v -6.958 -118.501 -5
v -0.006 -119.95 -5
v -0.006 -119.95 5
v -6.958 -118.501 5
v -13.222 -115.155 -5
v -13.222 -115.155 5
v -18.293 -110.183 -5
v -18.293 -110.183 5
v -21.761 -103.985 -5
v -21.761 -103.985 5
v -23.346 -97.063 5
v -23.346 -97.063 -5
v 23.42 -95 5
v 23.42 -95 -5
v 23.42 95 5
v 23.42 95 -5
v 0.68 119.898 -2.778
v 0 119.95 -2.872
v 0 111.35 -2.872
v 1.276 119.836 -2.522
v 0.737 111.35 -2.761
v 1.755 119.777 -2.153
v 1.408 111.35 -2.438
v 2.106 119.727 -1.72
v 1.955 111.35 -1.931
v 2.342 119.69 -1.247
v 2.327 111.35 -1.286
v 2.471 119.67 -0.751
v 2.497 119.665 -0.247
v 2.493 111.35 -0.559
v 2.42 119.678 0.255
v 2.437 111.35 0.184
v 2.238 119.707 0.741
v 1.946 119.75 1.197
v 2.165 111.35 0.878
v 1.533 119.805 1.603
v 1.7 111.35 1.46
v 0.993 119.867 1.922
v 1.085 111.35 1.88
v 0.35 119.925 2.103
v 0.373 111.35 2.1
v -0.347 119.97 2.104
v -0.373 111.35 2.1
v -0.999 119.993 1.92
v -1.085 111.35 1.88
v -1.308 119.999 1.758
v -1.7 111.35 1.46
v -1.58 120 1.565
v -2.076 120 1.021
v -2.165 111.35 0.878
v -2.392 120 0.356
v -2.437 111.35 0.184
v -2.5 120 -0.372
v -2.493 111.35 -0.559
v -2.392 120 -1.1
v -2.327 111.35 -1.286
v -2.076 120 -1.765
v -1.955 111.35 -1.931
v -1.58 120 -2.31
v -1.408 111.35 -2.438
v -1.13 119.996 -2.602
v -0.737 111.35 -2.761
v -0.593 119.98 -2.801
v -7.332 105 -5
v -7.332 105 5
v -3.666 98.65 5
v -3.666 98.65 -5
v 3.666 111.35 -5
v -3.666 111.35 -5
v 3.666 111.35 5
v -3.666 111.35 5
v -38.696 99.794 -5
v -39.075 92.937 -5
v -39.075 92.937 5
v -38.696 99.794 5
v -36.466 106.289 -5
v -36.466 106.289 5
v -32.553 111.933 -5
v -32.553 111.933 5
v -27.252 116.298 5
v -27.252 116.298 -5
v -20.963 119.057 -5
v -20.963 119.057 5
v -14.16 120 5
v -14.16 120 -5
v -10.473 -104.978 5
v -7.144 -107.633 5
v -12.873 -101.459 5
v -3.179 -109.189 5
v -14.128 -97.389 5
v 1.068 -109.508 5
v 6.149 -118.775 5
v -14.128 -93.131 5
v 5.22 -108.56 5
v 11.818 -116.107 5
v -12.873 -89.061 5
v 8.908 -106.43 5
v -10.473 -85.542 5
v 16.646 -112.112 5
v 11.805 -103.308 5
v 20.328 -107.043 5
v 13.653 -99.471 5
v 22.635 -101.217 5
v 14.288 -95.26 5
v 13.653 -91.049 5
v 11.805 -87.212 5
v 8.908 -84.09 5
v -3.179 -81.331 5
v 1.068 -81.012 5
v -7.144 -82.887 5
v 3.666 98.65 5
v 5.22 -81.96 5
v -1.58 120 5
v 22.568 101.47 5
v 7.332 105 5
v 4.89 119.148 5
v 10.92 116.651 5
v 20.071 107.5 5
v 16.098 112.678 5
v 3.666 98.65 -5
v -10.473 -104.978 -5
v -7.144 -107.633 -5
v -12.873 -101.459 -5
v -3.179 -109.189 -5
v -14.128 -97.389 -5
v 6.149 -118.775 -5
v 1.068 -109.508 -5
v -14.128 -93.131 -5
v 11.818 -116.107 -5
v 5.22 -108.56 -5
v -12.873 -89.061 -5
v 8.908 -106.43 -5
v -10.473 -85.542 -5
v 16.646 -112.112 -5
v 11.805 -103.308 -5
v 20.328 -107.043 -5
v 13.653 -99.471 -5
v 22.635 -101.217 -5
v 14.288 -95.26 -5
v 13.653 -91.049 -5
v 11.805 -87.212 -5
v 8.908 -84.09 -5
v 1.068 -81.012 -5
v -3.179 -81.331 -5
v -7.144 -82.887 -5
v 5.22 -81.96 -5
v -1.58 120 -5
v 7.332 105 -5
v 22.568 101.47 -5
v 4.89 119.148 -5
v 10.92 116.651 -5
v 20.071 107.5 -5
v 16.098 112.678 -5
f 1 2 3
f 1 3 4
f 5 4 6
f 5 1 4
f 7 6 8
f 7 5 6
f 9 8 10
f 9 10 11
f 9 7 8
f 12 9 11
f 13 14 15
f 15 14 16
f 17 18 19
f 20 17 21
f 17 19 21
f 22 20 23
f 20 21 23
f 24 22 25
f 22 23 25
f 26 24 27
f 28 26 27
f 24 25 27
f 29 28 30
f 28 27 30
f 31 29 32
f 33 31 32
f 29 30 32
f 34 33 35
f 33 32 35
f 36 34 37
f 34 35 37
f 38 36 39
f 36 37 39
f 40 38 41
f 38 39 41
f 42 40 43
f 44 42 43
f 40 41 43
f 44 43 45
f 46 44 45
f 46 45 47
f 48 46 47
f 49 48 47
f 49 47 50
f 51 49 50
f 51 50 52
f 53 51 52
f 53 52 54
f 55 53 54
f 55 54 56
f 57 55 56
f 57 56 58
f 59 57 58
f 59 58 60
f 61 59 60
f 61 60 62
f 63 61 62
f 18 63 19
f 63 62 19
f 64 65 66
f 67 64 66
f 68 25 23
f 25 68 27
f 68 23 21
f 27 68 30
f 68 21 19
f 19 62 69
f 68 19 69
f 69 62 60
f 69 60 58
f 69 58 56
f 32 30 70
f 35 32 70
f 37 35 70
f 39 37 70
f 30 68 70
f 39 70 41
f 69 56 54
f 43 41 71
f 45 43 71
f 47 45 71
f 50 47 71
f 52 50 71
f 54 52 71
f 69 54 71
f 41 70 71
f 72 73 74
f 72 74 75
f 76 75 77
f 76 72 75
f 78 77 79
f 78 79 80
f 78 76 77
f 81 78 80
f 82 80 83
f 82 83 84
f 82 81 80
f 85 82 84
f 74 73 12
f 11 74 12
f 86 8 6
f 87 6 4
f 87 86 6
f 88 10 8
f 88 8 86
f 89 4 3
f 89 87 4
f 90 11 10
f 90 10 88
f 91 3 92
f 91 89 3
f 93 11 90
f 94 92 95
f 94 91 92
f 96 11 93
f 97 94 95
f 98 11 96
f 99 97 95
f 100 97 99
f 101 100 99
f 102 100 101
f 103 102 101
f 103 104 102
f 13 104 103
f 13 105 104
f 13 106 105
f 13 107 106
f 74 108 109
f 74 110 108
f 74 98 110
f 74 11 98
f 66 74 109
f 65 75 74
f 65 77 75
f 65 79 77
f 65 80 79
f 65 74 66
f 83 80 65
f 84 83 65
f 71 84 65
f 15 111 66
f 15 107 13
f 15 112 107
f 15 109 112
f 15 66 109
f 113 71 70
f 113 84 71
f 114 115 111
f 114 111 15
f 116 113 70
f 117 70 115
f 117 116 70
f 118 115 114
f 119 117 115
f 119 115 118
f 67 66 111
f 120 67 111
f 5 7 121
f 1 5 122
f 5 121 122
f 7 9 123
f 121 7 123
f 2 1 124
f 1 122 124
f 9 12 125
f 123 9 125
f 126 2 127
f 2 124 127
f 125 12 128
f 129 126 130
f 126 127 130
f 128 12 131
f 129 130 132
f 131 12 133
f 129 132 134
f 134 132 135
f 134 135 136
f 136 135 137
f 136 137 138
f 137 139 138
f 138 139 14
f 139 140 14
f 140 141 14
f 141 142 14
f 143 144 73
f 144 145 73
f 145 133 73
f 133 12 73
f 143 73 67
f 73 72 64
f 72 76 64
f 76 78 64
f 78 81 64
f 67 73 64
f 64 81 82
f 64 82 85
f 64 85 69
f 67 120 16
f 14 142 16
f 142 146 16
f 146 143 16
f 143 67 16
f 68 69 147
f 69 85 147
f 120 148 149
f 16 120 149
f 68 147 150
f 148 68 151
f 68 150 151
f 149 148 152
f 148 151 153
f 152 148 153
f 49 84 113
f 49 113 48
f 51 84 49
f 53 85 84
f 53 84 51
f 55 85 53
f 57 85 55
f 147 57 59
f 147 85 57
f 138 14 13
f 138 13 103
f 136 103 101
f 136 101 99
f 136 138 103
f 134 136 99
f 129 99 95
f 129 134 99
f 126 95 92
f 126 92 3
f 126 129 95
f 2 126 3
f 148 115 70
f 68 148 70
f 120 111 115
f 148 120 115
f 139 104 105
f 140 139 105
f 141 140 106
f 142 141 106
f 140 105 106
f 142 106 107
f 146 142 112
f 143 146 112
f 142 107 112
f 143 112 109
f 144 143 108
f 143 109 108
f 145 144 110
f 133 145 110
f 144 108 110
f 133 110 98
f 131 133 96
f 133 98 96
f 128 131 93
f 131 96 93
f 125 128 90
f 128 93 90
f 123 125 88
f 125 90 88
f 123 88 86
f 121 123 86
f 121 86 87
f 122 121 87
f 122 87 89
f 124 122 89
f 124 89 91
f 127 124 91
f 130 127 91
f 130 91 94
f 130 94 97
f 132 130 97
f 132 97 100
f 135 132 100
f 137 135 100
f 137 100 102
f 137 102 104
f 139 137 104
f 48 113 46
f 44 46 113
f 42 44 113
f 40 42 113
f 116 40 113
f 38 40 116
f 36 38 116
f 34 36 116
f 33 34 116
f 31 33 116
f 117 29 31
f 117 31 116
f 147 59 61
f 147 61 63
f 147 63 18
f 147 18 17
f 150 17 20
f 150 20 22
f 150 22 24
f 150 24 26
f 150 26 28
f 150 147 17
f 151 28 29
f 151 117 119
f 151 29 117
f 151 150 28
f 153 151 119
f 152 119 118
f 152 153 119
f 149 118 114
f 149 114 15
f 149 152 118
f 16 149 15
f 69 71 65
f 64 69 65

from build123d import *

# Parameters (mm, degrees)
SKETCH1_W                       = 80
SKETCH1_H                       = 10
BOSS_EXTRUDE1_DEPTH             = 120
SKETCH2_R                       = 14.2875
HOLES_DEPTH                     = 127
SKETCH5_W                       = 16.58
SKETCH5_H                       = 240
WEDGE_SHAPE_DEPTH               = 127.885775404
FILLET6_START                   = -6
FILLET6_DEPTH                   = 12
TAP_DRILL_FOR_M6X1_0_TAP1_D     = 5
TAP_DRILL_FOR_M6X1_0_TAP1_DEPTH = 8.651


with BuildPart() as part:
    # Sketch1 → Boss-Extrude1 (new, symmetric)
    with BuildSketch(Plane(origin=(0, 0, 0), x_dir=(1, 0, 0), z_dir=(0, 1, 0))):
        Rectangle(SKETCH1_W, SKETCH1_H)
    extrude(amount=BOSS_EXTRUDE1_DEPTH, both=True)

    # Sketch2 → Holes (cut)
    with BuildSketch(Plane.XY.offset(5)):
        with Locations((0, -95.26)):
            Circle(SKETCH2_R)
        Polygon((3.666174209, 98.65), (7.332348419, 105), (3.666174209, 111.35), (-3.666174209, 111.35), (-7.332348419, 105), (-3.666174209, 98.65), align=None)
    extrude(amount=-HOLES_DEPTH, mode=Mode.SUBTRACT)

    # Sketch5 → Wedge shape (cut, through all)
    with BuildSketch(Plane(origin=(0, 0, -5), x_dir=(-1, 0, 0), z_dir=(0, 0, -1))):
        with BuildLine():
            Line((40, 104.109763944), (21.447331521, -120))
            ThreePointArc((21.447331521, -120), (30.723665761, -120.383309719), (40, -120))
            Line((40, -120), (40, 104.109763944))
        make_face()
        with Locations((-31.71, 0)):
            Rectangle(SKETCH5_W, SKETCH5_H)
    extrude(amount=-WEDGE_SHAPE_DEPTH, mode=Mode.SUBTRACT)

    # Fillet6: read off the stored shape, not the designer's step
    # Fillet6 outline → Fillet6 (cut)
    with BuildSketch(Plane.XY.offset(FILLET6_START)):
        with BuildLine():
            ThreePointArc((-0.005704702, -119.950382649), (-15.93515227, -112.84990156), (-23.346182643, -97.062540783))
            Line((-23.346182643, -97.062540783), (-21.447331521, -120))
            Line((-21.447331521, -120), (23.42, -120))
            Line((23.42, -120), (23.42, -95))
            ThreePointArc((23.42, -95), (16.645769976, -112.112022346), (-0.005704702, -119.950382649))
        make_face()
        with BuildLine():
            Line((-40, 104.109763944), (-39.075113631, 92.937459217))
            ThreePointArc((-39.075113631, 92.937459217), (-32.552777964, 111.932756427), (-14.160340393, 120))
            Line((-14.160340393, 120), (-40, 120))
            Line((-40, 120), (-40, 104.109763944))
        make_face()
        with BuildLine():
            ThreePointArc((-1.58, 120), (16.09766953, 112.67766953), (23.42, 95))
            Line((23.42, 95), (23.42, 120))
            Line((23.42, 120), (-1.58, 120))
        make_face()
    extrude(amount=FILLET6_DEPTH, mode=Mode.SUBTRACT)

    # Tap Drill for M6x1.0 Tap1
    with Locations(Plane(origin=(0, 120, -0.37225415), x_dir=(0, 0, 1), z_dir=(0, 1, 0))):
        with Locations((0, 0)):
            Hole(TAP_DRILL_FOR_M6X1_0_TAP1_D / 2, depth=TAP_DRILL_FOR_M6X1_0_TAP1_DEPTH)


solid = part.part
